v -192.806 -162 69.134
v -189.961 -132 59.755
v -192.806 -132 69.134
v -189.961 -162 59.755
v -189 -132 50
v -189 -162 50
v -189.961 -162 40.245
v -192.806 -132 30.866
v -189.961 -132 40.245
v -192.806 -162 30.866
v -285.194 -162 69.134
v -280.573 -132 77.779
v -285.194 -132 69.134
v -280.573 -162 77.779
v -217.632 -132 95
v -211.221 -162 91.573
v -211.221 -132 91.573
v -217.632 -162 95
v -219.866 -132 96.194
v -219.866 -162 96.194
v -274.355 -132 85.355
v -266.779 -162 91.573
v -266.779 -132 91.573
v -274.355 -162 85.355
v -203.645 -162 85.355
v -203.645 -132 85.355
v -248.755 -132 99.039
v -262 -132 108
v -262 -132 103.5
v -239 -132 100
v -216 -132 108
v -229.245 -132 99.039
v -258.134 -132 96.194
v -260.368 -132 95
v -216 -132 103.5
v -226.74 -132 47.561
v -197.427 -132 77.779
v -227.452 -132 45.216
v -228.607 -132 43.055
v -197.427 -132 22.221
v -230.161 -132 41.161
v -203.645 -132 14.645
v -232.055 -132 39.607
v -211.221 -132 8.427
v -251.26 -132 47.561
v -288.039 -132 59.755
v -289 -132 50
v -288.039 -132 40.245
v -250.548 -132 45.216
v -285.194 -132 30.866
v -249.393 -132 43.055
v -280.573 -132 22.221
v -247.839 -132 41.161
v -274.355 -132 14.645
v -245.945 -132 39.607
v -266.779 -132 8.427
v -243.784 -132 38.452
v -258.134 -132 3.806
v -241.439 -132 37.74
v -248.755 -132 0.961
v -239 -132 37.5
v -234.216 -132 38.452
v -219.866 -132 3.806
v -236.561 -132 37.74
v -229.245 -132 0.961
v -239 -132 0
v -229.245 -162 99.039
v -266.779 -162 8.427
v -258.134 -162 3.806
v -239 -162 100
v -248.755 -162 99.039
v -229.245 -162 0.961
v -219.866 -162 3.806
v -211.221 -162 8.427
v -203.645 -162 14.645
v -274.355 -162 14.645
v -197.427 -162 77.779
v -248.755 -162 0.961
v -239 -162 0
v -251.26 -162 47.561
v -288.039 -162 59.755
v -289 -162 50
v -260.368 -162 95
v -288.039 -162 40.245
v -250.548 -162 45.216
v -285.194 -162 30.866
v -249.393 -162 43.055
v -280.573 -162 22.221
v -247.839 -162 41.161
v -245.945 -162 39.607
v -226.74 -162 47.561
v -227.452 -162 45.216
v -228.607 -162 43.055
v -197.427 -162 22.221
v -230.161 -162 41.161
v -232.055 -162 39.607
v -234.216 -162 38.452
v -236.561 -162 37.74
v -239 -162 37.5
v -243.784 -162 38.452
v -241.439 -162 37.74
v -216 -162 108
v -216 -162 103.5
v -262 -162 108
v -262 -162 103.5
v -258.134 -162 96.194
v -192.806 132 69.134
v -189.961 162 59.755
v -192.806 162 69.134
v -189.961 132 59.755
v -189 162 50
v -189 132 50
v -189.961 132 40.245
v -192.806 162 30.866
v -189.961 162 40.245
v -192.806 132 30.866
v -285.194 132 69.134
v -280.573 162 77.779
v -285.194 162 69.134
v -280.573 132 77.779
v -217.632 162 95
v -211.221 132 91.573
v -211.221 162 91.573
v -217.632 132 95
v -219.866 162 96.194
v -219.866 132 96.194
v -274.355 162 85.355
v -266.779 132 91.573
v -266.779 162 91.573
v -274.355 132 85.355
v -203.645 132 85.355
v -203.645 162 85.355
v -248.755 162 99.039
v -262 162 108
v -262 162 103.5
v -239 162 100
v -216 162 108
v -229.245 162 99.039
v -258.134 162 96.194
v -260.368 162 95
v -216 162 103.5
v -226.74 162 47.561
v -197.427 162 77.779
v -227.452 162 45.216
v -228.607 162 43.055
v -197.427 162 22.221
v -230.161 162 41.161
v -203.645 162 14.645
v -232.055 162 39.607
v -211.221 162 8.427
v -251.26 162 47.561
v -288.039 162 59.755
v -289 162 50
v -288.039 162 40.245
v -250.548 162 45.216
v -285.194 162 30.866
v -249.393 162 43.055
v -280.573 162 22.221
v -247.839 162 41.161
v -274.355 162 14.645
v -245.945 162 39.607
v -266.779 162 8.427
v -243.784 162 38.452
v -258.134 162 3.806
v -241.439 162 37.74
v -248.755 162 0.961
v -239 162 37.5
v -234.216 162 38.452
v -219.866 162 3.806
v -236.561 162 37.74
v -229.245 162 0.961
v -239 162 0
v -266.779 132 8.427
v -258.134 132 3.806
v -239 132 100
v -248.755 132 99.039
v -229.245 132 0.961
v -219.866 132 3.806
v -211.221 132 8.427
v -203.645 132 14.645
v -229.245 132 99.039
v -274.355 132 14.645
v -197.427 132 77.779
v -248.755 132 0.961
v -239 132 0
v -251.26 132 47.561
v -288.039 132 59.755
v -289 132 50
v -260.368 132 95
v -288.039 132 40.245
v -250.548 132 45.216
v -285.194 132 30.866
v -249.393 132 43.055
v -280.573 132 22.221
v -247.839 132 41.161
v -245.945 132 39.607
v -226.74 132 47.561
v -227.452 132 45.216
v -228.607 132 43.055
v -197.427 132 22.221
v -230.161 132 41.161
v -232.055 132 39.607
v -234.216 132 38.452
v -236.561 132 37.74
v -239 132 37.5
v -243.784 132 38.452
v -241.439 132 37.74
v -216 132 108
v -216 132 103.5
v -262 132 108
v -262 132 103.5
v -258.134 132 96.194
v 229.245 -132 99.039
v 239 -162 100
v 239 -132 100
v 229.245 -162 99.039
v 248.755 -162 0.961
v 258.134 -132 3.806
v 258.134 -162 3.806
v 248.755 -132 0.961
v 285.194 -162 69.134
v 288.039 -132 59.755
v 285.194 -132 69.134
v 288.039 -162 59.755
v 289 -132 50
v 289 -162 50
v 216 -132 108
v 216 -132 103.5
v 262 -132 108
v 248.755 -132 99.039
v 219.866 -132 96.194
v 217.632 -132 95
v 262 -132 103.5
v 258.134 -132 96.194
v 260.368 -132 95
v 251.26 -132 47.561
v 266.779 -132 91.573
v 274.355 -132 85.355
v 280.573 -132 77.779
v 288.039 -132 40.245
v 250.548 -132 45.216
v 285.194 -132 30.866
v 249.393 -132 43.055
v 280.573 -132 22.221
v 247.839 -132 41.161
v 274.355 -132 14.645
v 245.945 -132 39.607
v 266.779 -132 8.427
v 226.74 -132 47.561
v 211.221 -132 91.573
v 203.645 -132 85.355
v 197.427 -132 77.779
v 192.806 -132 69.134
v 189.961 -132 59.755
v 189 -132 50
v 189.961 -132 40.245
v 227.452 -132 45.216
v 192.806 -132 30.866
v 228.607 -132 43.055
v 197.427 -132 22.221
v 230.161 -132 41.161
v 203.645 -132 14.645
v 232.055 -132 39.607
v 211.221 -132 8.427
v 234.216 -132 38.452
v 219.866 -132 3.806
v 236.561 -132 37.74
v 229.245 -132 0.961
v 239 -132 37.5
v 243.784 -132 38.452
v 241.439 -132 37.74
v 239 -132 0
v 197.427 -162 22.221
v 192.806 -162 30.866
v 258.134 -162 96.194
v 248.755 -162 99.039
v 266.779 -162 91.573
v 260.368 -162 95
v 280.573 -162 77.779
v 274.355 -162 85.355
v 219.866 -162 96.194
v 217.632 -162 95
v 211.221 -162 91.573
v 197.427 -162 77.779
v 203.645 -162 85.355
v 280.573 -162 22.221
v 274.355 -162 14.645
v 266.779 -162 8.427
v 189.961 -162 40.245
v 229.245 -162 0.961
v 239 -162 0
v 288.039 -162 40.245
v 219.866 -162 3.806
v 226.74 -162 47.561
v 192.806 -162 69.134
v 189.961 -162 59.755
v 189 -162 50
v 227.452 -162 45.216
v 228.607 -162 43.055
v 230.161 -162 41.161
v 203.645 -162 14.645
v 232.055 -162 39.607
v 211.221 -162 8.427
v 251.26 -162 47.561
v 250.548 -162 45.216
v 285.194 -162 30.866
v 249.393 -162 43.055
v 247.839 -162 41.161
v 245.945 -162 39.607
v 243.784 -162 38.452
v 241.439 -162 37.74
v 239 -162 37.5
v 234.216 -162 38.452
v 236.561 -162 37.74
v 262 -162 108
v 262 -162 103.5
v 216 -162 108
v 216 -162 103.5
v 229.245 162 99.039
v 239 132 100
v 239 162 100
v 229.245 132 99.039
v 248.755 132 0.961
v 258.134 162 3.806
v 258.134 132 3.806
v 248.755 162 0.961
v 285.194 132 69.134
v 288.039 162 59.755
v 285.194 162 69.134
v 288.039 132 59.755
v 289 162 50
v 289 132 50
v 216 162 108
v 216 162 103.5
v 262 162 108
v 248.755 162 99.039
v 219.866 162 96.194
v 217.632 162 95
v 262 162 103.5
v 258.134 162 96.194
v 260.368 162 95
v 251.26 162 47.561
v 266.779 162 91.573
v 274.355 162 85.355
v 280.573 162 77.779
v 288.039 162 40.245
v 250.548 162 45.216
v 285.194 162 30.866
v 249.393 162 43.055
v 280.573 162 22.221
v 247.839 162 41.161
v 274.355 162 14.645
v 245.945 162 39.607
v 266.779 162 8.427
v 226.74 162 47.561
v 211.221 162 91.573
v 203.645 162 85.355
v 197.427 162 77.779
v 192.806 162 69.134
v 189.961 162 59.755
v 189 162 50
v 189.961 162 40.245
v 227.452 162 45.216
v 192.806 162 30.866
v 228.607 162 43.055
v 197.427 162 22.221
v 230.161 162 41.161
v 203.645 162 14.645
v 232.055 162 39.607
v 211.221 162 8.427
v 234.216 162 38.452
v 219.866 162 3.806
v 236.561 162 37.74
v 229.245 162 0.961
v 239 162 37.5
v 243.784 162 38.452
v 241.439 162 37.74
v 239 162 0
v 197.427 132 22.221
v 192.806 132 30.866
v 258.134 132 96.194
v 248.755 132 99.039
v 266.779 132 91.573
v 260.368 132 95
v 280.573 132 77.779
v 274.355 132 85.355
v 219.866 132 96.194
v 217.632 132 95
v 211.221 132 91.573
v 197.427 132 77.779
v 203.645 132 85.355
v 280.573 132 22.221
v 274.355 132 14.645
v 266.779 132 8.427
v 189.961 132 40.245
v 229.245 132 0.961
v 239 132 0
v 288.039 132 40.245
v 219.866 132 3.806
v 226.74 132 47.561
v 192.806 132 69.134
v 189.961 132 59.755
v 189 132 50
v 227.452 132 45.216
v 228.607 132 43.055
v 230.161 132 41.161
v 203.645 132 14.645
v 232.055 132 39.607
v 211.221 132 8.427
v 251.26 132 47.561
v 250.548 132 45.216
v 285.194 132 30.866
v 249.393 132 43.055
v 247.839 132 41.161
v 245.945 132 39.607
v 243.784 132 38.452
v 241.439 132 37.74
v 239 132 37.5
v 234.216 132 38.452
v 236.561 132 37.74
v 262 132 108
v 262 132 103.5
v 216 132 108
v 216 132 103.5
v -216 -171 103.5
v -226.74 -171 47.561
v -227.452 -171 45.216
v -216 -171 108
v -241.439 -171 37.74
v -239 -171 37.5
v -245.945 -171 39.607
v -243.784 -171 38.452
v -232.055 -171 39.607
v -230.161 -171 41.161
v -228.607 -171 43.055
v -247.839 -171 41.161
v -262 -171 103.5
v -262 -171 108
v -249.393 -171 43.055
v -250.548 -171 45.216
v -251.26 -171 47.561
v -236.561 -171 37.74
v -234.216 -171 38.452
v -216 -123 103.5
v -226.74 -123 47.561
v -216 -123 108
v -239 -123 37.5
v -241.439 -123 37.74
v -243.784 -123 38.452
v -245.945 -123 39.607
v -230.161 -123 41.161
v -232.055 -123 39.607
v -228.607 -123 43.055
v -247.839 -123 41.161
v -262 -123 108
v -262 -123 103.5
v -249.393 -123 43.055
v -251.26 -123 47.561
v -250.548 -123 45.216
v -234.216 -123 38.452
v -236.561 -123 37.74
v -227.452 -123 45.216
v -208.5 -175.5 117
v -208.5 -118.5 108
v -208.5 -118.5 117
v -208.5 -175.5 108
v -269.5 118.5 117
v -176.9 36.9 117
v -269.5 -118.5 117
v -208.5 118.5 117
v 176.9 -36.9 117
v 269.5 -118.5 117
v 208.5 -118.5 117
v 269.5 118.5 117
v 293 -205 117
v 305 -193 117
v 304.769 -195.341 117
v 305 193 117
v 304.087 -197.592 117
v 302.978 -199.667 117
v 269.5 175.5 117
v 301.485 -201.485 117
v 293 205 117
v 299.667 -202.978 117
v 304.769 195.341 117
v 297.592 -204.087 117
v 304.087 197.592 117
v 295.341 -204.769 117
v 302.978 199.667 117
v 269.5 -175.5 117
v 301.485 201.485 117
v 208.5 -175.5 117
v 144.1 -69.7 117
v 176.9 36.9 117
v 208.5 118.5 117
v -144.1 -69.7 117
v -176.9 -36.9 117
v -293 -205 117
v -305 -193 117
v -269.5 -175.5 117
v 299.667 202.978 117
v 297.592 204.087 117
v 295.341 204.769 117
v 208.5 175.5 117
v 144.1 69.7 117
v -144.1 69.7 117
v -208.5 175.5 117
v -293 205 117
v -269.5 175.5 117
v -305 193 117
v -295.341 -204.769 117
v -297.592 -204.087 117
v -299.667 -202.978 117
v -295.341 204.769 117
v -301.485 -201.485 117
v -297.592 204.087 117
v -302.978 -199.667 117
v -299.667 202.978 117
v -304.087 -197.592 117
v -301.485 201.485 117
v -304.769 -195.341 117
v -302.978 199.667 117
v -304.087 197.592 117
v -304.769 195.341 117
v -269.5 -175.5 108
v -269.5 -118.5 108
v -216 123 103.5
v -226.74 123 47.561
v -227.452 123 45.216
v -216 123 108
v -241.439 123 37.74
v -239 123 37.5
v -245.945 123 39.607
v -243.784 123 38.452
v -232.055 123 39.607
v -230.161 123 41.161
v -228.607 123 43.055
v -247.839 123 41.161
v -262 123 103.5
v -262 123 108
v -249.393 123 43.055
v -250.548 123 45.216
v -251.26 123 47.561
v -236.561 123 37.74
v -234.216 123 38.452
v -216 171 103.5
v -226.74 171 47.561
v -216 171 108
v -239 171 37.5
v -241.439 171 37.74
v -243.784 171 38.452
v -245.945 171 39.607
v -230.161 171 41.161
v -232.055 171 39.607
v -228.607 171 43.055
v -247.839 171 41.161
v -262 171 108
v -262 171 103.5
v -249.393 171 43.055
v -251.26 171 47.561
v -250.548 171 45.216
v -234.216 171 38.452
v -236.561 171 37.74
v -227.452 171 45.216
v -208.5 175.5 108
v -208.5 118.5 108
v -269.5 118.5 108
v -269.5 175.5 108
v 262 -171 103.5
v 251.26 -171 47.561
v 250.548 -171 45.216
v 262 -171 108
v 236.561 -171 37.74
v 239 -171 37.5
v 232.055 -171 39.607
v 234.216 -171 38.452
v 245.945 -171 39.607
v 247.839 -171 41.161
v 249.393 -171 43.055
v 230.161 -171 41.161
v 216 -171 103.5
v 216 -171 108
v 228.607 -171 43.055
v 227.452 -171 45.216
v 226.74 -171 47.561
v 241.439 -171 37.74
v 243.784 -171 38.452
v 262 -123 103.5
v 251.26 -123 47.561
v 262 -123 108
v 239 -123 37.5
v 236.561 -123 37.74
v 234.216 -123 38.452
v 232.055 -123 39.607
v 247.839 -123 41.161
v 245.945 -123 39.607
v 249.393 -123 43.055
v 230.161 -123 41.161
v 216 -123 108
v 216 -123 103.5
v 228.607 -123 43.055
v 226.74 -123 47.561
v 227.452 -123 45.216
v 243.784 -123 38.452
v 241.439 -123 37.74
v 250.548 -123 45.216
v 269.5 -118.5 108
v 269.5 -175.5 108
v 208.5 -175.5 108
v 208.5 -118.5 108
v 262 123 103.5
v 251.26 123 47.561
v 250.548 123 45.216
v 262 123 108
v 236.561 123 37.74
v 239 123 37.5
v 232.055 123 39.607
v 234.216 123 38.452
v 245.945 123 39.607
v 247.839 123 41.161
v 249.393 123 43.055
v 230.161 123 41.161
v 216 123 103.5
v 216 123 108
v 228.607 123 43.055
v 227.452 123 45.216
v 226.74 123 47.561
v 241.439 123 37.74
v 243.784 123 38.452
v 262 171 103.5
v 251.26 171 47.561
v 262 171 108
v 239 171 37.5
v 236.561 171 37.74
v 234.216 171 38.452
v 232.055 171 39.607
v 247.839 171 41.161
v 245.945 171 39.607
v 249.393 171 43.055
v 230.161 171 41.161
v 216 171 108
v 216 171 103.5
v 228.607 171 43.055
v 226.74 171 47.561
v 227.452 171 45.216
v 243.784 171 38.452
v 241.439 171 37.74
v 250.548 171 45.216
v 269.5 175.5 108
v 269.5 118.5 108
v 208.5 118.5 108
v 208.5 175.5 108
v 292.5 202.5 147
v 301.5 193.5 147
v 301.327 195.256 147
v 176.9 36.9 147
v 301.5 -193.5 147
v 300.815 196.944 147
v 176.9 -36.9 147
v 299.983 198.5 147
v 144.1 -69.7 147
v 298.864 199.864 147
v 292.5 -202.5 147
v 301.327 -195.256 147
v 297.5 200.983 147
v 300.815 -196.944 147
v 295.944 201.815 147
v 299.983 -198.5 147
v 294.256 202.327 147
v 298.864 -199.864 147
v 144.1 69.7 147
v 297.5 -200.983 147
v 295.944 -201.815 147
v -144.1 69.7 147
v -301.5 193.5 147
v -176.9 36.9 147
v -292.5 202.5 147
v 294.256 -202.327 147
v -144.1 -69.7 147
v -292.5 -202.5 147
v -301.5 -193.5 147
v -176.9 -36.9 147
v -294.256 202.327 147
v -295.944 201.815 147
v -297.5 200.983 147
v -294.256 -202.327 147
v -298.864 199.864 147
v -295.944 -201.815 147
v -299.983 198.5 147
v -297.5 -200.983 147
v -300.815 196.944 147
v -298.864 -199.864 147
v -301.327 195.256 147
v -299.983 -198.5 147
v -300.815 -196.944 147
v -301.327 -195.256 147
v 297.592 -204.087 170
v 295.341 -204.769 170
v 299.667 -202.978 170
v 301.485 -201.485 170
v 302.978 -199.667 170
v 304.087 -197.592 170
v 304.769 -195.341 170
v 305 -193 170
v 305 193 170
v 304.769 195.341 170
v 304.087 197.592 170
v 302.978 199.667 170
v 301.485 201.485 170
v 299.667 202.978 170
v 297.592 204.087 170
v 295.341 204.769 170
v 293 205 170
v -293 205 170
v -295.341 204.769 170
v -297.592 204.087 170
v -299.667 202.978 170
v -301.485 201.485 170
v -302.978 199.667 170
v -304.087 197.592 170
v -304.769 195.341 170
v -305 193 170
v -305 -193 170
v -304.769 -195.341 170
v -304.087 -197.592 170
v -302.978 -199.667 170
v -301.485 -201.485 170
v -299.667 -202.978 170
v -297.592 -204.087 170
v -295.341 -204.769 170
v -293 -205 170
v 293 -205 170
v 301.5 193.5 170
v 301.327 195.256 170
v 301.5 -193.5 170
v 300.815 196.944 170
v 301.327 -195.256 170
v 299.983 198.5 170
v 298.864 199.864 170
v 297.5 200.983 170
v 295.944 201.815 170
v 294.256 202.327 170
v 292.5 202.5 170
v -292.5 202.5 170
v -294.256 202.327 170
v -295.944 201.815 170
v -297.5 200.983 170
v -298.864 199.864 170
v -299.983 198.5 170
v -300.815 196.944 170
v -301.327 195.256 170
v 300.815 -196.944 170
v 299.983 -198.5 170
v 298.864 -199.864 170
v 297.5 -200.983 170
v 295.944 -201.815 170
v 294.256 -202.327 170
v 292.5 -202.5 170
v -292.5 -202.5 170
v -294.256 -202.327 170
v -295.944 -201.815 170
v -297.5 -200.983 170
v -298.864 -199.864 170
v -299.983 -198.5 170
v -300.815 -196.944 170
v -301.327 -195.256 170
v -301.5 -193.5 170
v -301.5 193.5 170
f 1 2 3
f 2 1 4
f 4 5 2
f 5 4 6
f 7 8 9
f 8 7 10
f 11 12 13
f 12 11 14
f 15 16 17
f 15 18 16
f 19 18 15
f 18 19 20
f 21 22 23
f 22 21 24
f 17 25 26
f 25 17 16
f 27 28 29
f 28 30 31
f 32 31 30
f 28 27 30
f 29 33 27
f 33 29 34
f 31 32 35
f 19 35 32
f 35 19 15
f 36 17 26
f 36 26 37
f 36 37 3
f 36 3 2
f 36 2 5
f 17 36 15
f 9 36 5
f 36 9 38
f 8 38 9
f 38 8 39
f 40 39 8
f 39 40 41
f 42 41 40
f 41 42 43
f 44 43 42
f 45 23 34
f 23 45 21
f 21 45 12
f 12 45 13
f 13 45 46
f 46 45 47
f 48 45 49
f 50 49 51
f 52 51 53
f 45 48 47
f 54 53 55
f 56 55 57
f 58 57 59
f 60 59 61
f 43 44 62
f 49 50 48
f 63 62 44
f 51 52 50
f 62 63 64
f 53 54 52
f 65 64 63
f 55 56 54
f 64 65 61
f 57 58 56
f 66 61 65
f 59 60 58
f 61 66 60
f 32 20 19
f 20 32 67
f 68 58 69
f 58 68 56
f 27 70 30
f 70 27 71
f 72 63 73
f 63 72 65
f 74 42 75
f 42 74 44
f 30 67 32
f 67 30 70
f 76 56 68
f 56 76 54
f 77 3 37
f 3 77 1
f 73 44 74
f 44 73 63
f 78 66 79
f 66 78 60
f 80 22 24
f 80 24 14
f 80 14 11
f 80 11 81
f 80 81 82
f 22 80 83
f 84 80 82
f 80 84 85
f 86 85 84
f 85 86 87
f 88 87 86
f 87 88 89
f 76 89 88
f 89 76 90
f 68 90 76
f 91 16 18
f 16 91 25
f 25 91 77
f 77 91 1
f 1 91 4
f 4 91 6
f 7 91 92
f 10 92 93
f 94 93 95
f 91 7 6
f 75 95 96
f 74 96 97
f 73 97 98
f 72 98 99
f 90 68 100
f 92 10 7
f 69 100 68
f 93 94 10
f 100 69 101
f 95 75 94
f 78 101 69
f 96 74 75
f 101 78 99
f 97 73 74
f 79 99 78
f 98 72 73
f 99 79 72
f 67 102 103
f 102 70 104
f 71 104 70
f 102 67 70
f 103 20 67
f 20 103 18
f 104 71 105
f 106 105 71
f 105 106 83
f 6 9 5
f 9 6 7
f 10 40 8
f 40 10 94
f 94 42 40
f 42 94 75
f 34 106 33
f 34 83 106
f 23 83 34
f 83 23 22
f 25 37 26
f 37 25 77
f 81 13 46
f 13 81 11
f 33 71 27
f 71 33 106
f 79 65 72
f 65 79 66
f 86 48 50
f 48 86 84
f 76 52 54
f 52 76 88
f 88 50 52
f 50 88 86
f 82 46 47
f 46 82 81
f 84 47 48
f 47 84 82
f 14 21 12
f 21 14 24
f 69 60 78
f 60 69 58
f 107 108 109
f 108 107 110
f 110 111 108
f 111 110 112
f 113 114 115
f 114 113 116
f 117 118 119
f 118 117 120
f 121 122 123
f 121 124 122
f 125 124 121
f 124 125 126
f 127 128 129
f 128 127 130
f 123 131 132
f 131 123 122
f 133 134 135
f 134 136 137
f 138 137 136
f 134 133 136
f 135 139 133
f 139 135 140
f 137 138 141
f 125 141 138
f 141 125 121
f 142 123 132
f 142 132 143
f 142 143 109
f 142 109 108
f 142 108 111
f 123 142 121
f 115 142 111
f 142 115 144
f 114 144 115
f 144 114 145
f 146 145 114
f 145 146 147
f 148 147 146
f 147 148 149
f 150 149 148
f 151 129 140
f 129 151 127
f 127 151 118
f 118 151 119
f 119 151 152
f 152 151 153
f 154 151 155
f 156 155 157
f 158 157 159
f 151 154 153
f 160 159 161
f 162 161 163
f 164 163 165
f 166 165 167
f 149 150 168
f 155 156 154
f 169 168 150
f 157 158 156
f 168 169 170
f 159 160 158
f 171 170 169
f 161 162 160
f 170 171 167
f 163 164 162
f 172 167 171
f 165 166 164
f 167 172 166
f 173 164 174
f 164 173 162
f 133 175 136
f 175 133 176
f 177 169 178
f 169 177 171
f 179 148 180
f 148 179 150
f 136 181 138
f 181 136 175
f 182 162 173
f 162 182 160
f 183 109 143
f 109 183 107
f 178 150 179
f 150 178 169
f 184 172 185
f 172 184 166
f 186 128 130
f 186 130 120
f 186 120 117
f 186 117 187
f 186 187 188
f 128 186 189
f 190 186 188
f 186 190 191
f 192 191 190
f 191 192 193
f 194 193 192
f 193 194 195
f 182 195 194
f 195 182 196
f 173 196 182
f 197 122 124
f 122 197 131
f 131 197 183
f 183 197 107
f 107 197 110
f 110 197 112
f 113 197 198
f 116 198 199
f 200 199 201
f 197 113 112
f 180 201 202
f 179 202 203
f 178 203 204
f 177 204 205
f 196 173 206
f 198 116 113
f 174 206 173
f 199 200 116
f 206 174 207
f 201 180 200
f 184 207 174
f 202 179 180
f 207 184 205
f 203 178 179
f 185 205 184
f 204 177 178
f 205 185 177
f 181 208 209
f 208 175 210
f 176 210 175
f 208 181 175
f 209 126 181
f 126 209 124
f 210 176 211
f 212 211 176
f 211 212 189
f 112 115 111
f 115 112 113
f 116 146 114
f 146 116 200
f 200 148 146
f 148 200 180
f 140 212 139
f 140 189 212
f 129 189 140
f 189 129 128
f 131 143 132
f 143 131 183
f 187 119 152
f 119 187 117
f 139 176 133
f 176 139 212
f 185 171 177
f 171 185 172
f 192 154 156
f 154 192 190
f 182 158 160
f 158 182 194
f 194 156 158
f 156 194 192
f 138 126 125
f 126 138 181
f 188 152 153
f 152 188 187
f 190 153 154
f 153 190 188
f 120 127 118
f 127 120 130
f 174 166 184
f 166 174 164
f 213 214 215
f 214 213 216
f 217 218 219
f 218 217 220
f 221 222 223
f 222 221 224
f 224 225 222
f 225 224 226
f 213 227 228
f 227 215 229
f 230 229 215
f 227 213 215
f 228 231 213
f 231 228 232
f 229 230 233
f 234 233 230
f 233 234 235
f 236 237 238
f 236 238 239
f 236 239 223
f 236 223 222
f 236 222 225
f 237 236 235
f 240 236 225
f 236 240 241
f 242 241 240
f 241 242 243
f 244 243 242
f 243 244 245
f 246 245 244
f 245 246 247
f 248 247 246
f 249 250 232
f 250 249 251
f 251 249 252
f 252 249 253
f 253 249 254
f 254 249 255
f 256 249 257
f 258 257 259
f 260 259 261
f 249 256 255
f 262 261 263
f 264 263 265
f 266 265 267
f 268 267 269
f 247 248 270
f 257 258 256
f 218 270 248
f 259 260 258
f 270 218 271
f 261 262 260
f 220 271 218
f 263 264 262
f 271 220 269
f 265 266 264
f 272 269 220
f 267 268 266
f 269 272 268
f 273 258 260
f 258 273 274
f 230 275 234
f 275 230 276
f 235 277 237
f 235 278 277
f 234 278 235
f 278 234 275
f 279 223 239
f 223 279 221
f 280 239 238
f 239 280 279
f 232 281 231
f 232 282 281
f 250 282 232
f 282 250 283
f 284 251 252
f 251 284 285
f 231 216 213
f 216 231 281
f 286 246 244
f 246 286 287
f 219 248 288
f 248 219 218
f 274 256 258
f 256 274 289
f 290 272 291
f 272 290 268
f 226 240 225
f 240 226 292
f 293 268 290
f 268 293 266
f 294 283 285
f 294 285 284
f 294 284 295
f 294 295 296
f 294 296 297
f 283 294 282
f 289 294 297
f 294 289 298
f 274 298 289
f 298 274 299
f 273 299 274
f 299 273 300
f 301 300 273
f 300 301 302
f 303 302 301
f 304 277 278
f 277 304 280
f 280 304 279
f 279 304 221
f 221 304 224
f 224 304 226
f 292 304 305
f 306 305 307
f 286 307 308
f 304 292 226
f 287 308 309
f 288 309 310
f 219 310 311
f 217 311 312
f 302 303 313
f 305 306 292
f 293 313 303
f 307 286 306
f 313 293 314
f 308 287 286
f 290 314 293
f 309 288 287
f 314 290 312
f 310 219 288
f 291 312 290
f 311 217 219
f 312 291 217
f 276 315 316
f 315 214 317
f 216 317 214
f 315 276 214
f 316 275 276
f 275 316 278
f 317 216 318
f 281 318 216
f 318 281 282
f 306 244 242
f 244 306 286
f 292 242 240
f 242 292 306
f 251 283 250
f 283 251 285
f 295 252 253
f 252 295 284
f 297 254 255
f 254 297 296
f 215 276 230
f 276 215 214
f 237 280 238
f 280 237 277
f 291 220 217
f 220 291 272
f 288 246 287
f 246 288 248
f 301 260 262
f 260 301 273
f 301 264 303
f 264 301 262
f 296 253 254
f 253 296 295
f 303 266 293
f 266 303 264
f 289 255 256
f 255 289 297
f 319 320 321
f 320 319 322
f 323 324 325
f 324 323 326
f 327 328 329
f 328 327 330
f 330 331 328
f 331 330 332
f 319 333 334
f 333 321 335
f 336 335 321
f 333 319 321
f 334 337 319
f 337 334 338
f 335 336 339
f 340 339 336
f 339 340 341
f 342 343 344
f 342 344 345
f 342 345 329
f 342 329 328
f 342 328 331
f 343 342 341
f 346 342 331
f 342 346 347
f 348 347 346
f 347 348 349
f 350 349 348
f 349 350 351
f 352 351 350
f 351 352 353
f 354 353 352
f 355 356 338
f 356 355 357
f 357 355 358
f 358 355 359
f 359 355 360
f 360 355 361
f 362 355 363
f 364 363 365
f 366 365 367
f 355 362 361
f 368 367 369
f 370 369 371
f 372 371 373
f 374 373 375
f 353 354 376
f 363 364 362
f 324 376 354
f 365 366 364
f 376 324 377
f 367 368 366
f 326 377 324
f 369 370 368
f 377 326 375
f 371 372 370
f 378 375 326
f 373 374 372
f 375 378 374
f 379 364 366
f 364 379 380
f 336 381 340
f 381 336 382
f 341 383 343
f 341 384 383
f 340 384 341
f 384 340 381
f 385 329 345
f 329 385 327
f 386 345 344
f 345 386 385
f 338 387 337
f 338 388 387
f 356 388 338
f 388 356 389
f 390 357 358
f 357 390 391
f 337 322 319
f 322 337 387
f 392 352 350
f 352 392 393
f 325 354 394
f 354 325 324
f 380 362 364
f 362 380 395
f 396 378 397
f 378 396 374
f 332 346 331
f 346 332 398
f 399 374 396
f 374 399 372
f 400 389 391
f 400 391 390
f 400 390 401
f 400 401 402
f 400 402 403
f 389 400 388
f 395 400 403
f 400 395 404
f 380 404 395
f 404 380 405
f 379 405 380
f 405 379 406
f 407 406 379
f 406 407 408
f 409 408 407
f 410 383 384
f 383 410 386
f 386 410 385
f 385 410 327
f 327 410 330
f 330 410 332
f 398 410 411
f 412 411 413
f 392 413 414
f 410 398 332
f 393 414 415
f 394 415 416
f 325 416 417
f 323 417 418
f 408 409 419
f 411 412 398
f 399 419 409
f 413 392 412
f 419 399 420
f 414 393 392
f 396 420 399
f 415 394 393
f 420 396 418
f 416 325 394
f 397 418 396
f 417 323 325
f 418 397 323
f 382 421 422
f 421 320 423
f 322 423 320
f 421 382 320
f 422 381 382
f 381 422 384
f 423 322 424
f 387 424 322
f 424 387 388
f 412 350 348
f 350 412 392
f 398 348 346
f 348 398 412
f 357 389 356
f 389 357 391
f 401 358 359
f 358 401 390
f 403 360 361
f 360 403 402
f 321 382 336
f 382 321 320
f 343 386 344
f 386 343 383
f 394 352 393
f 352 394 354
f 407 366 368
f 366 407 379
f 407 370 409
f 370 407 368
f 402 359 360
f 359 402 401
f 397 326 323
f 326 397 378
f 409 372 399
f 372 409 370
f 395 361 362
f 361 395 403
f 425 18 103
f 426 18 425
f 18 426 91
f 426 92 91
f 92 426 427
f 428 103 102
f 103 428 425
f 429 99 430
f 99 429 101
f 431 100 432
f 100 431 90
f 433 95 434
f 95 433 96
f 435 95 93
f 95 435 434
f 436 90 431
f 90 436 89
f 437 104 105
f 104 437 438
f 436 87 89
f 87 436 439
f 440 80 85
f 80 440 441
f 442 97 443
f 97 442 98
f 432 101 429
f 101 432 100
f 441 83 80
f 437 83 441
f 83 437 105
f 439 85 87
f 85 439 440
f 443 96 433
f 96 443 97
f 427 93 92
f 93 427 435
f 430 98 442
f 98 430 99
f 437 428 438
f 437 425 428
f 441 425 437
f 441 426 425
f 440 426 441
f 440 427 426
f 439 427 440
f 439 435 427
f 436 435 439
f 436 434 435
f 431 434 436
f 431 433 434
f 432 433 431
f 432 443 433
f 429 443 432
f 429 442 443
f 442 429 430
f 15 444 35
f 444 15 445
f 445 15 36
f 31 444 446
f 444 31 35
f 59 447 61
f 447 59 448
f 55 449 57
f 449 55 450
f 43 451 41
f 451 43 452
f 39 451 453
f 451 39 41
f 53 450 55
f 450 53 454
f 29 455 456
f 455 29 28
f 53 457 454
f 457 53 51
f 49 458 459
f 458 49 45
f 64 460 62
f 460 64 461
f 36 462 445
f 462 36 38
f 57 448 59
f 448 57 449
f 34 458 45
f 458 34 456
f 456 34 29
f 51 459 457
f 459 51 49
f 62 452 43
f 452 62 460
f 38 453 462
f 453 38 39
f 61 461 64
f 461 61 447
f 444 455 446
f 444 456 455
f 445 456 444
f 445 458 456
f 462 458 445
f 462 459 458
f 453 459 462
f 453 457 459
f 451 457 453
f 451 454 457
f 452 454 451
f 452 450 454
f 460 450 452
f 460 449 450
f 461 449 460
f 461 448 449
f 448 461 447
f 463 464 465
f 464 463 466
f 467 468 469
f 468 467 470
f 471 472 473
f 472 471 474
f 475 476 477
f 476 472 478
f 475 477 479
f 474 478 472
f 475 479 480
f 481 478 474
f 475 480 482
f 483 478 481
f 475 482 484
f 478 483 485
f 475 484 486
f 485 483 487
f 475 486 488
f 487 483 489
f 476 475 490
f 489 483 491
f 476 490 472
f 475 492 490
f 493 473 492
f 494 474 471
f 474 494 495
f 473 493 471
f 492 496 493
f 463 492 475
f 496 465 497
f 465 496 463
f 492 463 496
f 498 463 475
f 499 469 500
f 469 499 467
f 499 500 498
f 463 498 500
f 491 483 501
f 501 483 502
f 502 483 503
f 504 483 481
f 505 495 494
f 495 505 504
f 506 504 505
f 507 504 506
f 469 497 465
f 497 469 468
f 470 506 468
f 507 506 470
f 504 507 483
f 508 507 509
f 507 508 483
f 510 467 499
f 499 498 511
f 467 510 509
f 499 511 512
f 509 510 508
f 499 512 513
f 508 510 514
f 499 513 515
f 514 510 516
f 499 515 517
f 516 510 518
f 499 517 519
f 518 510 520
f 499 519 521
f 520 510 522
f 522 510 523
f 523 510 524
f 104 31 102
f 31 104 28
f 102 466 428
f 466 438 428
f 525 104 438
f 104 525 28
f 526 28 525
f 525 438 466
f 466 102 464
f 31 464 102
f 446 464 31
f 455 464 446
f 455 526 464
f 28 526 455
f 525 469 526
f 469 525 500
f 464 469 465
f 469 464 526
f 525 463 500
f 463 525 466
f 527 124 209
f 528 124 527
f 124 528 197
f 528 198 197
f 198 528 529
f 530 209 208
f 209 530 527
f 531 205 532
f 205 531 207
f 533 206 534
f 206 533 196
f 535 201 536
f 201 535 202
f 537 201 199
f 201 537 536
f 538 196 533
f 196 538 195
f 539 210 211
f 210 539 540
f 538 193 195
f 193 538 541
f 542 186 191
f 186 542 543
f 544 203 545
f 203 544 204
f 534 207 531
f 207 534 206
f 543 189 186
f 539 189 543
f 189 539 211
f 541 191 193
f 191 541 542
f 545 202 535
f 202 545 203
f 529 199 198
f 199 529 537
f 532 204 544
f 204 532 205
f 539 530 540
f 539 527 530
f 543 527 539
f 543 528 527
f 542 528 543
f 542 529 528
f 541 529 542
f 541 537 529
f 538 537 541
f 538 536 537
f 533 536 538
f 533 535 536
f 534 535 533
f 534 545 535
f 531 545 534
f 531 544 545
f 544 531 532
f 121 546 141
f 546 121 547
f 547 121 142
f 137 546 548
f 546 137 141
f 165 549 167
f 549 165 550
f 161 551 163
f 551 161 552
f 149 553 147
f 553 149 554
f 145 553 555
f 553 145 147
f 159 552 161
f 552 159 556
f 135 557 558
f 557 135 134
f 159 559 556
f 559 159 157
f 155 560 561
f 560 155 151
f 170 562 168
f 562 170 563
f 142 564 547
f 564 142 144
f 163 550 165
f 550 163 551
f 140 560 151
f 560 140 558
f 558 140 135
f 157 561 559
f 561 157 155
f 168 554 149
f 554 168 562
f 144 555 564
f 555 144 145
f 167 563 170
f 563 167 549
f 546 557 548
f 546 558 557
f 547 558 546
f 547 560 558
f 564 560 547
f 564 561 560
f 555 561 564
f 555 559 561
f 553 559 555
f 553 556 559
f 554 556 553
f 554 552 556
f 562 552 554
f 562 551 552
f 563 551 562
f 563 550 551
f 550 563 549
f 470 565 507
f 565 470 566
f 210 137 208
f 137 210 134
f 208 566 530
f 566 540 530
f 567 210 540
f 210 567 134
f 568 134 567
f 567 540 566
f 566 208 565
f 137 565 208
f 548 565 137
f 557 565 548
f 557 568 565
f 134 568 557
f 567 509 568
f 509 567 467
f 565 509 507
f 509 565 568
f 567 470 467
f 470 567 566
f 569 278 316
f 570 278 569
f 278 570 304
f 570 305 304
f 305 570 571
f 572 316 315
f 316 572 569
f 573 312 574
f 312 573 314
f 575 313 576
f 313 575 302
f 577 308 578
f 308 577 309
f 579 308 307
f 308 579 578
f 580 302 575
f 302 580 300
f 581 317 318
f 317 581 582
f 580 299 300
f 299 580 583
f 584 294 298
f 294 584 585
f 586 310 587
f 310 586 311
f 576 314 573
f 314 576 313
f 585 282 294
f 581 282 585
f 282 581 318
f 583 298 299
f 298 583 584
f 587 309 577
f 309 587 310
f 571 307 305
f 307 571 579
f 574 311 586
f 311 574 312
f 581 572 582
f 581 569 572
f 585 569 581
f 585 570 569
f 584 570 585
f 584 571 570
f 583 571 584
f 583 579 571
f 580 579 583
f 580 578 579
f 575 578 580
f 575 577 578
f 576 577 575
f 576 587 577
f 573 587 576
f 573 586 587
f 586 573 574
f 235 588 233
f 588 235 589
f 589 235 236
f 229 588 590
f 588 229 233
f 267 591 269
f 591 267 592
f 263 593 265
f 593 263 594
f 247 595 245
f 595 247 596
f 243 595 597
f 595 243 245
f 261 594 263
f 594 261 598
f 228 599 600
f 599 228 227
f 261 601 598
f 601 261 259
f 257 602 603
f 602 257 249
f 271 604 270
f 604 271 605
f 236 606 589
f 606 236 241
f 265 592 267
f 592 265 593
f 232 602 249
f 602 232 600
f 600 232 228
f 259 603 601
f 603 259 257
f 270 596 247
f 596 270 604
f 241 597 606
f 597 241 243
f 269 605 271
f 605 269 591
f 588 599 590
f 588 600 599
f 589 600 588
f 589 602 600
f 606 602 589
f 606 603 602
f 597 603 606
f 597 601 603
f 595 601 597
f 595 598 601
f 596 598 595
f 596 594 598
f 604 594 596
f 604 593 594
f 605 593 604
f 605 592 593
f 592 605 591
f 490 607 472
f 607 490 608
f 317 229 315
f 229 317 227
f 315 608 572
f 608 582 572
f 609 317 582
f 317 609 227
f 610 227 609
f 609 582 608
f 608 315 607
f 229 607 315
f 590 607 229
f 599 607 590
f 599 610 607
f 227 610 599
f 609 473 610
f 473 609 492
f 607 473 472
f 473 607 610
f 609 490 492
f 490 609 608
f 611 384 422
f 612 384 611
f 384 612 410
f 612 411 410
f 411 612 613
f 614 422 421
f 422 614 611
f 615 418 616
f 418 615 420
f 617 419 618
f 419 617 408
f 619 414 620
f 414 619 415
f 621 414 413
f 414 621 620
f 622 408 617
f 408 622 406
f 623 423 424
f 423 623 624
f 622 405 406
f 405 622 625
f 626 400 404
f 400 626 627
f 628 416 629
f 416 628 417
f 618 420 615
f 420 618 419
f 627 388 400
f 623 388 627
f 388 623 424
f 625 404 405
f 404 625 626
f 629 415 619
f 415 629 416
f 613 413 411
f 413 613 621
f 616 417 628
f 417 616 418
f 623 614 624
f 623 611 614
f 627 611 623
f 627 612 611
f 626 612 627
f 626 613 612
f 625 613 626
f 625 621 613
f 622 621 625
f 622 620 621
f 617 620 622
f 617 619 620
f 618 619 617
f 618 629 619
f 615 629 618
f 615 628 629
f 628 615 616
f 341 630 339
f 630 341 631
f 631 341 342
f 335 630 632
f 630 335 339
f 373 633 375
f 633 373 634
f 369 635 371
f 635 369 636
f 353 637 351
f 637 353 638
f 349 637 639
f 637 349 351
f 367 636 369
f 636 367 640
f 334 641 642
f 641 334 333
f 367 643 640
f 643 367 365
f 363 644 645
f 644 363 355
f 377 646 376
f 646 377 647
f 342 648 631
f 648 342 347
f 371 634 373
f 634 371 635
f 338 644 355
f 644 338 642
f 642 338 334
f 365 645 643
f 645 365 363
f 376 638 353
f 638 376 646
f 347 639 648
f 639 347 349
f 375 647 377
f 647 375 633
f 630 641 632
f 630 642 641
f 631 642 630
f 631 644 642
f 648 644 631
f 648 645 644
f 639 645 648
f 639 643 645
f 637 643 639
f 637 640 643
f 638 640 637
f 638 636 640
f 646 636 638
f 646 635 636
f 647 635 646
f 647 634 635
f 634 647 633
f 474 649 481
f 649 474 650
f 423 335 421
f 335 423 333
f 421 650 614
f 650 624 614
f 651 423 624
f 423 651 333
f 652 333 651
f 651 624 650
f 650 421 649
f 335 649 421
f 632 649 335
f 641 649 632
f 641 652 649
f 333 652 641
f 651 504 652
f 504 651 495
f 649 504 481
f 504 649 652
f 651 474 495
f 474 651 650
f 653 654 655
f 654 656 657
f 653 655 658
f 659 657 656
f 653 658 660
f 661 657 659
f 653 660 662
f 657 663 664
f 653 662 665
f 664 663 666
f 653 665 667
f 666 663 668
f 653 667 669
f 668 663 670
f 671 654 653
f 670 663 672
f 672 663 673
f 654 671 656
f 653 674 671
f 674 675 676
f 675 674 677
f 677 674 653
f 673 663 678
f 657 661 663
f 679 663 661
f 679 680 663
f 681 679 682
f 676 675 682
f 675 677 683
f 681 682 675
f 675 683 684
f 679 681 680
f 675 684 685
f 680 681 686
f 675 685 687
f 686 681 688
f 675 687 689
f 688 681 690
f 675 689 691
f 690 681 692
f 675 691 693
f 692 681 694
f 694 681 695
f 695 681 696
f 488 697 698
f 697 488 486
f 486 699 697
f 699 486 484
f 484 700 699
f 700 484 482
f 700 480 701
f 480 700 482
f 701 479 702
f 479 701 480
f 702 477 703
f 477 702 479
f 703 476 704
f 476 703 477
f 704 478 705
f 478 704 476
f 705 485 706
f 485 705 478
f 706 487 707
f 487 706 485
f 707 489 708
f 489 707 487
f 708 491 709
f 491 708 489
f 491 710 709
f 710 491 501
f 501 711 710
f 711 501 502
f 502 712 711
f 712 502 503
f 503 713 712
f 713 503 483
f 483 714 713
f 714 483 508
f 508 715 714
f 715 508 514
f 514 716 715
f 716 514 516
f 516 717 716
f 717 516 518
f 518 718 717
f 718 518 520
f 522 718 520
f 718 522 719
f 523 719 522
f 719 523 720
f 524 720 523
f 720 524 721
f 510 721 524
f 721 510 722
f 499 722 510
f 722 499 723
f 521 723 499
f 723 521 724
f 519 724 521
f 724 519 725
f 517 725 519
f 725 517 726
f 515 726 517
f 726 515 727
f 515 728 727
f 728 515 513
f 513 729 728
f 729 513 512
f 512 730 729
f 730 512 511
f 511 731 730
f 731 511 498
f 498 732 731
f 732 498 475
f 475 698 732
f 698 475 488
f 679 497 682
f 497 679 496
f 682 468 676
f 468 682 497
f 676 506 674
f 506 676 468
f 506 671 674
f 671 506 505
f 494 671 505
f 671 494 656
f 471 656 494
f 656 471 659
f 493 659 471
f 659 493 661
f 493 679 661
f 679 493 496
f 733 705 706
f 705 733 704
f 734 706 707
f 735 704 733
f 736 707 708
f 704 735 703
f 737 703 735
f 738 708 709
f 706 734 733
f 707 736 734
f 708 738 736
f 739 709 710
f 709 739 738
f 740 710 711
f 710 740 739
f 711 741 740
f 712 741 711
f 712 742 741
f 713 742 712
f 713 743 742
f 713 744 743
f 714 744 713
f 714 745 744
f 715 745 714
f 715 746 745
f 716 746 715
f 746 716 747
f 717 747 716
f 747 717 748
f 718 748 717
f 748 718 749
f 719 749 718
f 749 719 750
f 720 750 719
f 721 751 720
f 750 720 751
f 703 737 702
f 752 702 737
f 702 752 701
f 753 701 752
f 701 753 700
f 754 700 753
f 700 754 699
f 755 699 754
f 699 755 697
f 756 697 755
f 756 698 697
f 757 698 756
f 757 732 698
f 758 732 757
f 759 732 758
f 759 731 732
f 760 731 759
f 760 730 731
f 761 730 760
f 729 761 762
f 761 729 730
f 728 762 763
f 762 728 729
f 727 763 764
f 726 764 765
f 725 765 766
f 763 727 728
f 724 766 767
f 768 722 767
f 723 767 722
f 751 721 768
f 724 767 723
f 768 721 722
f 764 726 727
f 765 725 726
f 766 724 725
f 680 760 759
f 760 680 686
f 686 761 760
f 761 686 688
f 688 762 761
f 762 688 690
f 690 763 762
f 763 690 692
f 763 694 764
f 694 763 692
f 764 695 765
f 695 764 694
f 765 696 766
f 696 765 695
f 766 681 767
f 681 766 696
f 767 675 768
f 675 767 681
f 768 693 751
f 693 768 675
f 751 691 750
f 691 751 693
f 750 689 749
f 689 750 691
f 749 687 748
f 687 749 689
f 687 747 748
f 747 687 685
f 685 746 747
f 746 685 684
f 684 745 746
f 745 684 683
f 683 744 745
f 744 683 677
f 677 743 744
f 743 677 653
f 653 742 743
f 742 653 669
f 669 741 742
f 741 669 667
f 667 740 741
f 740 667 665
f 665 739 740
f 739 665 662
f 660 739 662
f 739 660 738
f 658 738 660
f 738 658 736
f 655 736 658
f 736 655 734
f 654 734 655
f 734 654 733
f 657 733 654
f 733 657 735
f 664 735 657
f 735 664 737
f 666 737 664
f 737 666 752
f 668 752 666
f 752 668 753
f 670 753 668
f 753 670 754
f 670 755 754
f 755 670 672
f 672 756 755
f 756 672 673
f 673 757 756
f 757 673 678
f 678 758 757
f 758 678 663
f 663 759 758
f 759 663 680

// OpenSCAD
style = "bale_arm_crate_single";
seat_depth = 23;
seat_length = 603;
seat_width = 405;
deck = 30;
height = 170;
length = 610;
wheel = 100;
width = 410;
deck_color = "#edaf16";
trim_color = "#e39d12";
wheel_color = "#c8c6b5";
mount_color = "#9bA2A6";

// Dimensional reference in mm. X is length, Y is width and the floor is Z=0.
// The generated working.scad supplies the values above this template.
$fn = 32;
component = "all";
wood = style == "simple";
single_crate = style == "bale_arm_crate_single";
trim_height = wood ? 1.5 : single_crate ? seat_depth : 5;
deck_top = height - trim_height;
deck_base = deck_top - deck;
wheel_width = wheel * 0.30;
wheel_x = length / 2 - wheel * 0.66;
wheel_y = width / 2 - wheel * 0.58;

module rounded(l, w, radius) {
    offset(r=radius) square([l-2*radius, w-2*radius], center=true);
}

module octagon(l, w, c) {
    polygon([[-l/2+c,-w/2],[l/2-c,-w/2],[l/2,-w/2+c],[l/2,w/2-c],
             [l/2-c,w/2],[-l/2+c,w/2],[-l/2,w/2-c],[-l/2,-w/2+c]]);
}

module deck_outline() {
    difference() {
        rounded(length, width, wood ? 18 : 12);
        if (wood)
            translate([-length/2+42,0]) rounded(22,94,10);
        else if (single_crate)
            octagon(length*0.58, width*0.34, width*0.08);
        else
            for (s=[-1,1]) translate([s*length*0.24,0])
                rounded(length*0.14,width*0.23,9);
    }
}

module top_details() {
    if (wood)
        for (x=[-1,1], y=[-1,1])
            translate([x*(length/2-54),y*(width/2-50)]) circle(d=59);
    else if (single_crate)
        difference() {
            rounded(length,width,12);
            rounded(seat_length,seat_width,9);
        }
    else
        for (x=[-0.37,0,0.37], y=[-1,1])
            translate([x*length,y*(width/2-13)]) rounded(55,18,5);
}

module wheel_positions() {
    for (x=[-1,1], y=[-1,1])
        translate([x*wheel_x,y*wheel_y,0]) children();
}

module axle_cylinder(diameter, span) {
    rotate([90,0,0]) cylinder(d=diameter,h=span,center=true);
}

module bracket() {
    plate = wheel * 0.09;
    translate([0,0,deck_base-plate/2])
        cube([wheel*0.61,wheel_width+plate*3,plate], center=true);
    for (s=[-1,1])
        translate([0,s*(wheel_width/2+plate/2),0]) hull() {
            translate([0,0,wheel/2]) axle_cylinder(wheel*0.25,plate);
            translate([0,0,deck_base-plate]) cube([wheel*0.46,plate,plate],center=true);
        }
}

if (component=="all" || component=="deck")
    color(deck_color) translate([0,0,deck_base]) linear_extrude(deck) deck_outline();
if (component=="all" || component=="trim")
    color(trim_color) translate([0,0,deck_top]) linear_extrude(trim_height) top_details();
if (component=="all" || component=="wheels")
    color(wheel_color) wheel_positions() translate([0,0,wheel/2]) axle_cylinder(wheel,wheel_width);
if (component=="all" || component=="mounts")
    color(mount_color) wheel_positions() bracket();
